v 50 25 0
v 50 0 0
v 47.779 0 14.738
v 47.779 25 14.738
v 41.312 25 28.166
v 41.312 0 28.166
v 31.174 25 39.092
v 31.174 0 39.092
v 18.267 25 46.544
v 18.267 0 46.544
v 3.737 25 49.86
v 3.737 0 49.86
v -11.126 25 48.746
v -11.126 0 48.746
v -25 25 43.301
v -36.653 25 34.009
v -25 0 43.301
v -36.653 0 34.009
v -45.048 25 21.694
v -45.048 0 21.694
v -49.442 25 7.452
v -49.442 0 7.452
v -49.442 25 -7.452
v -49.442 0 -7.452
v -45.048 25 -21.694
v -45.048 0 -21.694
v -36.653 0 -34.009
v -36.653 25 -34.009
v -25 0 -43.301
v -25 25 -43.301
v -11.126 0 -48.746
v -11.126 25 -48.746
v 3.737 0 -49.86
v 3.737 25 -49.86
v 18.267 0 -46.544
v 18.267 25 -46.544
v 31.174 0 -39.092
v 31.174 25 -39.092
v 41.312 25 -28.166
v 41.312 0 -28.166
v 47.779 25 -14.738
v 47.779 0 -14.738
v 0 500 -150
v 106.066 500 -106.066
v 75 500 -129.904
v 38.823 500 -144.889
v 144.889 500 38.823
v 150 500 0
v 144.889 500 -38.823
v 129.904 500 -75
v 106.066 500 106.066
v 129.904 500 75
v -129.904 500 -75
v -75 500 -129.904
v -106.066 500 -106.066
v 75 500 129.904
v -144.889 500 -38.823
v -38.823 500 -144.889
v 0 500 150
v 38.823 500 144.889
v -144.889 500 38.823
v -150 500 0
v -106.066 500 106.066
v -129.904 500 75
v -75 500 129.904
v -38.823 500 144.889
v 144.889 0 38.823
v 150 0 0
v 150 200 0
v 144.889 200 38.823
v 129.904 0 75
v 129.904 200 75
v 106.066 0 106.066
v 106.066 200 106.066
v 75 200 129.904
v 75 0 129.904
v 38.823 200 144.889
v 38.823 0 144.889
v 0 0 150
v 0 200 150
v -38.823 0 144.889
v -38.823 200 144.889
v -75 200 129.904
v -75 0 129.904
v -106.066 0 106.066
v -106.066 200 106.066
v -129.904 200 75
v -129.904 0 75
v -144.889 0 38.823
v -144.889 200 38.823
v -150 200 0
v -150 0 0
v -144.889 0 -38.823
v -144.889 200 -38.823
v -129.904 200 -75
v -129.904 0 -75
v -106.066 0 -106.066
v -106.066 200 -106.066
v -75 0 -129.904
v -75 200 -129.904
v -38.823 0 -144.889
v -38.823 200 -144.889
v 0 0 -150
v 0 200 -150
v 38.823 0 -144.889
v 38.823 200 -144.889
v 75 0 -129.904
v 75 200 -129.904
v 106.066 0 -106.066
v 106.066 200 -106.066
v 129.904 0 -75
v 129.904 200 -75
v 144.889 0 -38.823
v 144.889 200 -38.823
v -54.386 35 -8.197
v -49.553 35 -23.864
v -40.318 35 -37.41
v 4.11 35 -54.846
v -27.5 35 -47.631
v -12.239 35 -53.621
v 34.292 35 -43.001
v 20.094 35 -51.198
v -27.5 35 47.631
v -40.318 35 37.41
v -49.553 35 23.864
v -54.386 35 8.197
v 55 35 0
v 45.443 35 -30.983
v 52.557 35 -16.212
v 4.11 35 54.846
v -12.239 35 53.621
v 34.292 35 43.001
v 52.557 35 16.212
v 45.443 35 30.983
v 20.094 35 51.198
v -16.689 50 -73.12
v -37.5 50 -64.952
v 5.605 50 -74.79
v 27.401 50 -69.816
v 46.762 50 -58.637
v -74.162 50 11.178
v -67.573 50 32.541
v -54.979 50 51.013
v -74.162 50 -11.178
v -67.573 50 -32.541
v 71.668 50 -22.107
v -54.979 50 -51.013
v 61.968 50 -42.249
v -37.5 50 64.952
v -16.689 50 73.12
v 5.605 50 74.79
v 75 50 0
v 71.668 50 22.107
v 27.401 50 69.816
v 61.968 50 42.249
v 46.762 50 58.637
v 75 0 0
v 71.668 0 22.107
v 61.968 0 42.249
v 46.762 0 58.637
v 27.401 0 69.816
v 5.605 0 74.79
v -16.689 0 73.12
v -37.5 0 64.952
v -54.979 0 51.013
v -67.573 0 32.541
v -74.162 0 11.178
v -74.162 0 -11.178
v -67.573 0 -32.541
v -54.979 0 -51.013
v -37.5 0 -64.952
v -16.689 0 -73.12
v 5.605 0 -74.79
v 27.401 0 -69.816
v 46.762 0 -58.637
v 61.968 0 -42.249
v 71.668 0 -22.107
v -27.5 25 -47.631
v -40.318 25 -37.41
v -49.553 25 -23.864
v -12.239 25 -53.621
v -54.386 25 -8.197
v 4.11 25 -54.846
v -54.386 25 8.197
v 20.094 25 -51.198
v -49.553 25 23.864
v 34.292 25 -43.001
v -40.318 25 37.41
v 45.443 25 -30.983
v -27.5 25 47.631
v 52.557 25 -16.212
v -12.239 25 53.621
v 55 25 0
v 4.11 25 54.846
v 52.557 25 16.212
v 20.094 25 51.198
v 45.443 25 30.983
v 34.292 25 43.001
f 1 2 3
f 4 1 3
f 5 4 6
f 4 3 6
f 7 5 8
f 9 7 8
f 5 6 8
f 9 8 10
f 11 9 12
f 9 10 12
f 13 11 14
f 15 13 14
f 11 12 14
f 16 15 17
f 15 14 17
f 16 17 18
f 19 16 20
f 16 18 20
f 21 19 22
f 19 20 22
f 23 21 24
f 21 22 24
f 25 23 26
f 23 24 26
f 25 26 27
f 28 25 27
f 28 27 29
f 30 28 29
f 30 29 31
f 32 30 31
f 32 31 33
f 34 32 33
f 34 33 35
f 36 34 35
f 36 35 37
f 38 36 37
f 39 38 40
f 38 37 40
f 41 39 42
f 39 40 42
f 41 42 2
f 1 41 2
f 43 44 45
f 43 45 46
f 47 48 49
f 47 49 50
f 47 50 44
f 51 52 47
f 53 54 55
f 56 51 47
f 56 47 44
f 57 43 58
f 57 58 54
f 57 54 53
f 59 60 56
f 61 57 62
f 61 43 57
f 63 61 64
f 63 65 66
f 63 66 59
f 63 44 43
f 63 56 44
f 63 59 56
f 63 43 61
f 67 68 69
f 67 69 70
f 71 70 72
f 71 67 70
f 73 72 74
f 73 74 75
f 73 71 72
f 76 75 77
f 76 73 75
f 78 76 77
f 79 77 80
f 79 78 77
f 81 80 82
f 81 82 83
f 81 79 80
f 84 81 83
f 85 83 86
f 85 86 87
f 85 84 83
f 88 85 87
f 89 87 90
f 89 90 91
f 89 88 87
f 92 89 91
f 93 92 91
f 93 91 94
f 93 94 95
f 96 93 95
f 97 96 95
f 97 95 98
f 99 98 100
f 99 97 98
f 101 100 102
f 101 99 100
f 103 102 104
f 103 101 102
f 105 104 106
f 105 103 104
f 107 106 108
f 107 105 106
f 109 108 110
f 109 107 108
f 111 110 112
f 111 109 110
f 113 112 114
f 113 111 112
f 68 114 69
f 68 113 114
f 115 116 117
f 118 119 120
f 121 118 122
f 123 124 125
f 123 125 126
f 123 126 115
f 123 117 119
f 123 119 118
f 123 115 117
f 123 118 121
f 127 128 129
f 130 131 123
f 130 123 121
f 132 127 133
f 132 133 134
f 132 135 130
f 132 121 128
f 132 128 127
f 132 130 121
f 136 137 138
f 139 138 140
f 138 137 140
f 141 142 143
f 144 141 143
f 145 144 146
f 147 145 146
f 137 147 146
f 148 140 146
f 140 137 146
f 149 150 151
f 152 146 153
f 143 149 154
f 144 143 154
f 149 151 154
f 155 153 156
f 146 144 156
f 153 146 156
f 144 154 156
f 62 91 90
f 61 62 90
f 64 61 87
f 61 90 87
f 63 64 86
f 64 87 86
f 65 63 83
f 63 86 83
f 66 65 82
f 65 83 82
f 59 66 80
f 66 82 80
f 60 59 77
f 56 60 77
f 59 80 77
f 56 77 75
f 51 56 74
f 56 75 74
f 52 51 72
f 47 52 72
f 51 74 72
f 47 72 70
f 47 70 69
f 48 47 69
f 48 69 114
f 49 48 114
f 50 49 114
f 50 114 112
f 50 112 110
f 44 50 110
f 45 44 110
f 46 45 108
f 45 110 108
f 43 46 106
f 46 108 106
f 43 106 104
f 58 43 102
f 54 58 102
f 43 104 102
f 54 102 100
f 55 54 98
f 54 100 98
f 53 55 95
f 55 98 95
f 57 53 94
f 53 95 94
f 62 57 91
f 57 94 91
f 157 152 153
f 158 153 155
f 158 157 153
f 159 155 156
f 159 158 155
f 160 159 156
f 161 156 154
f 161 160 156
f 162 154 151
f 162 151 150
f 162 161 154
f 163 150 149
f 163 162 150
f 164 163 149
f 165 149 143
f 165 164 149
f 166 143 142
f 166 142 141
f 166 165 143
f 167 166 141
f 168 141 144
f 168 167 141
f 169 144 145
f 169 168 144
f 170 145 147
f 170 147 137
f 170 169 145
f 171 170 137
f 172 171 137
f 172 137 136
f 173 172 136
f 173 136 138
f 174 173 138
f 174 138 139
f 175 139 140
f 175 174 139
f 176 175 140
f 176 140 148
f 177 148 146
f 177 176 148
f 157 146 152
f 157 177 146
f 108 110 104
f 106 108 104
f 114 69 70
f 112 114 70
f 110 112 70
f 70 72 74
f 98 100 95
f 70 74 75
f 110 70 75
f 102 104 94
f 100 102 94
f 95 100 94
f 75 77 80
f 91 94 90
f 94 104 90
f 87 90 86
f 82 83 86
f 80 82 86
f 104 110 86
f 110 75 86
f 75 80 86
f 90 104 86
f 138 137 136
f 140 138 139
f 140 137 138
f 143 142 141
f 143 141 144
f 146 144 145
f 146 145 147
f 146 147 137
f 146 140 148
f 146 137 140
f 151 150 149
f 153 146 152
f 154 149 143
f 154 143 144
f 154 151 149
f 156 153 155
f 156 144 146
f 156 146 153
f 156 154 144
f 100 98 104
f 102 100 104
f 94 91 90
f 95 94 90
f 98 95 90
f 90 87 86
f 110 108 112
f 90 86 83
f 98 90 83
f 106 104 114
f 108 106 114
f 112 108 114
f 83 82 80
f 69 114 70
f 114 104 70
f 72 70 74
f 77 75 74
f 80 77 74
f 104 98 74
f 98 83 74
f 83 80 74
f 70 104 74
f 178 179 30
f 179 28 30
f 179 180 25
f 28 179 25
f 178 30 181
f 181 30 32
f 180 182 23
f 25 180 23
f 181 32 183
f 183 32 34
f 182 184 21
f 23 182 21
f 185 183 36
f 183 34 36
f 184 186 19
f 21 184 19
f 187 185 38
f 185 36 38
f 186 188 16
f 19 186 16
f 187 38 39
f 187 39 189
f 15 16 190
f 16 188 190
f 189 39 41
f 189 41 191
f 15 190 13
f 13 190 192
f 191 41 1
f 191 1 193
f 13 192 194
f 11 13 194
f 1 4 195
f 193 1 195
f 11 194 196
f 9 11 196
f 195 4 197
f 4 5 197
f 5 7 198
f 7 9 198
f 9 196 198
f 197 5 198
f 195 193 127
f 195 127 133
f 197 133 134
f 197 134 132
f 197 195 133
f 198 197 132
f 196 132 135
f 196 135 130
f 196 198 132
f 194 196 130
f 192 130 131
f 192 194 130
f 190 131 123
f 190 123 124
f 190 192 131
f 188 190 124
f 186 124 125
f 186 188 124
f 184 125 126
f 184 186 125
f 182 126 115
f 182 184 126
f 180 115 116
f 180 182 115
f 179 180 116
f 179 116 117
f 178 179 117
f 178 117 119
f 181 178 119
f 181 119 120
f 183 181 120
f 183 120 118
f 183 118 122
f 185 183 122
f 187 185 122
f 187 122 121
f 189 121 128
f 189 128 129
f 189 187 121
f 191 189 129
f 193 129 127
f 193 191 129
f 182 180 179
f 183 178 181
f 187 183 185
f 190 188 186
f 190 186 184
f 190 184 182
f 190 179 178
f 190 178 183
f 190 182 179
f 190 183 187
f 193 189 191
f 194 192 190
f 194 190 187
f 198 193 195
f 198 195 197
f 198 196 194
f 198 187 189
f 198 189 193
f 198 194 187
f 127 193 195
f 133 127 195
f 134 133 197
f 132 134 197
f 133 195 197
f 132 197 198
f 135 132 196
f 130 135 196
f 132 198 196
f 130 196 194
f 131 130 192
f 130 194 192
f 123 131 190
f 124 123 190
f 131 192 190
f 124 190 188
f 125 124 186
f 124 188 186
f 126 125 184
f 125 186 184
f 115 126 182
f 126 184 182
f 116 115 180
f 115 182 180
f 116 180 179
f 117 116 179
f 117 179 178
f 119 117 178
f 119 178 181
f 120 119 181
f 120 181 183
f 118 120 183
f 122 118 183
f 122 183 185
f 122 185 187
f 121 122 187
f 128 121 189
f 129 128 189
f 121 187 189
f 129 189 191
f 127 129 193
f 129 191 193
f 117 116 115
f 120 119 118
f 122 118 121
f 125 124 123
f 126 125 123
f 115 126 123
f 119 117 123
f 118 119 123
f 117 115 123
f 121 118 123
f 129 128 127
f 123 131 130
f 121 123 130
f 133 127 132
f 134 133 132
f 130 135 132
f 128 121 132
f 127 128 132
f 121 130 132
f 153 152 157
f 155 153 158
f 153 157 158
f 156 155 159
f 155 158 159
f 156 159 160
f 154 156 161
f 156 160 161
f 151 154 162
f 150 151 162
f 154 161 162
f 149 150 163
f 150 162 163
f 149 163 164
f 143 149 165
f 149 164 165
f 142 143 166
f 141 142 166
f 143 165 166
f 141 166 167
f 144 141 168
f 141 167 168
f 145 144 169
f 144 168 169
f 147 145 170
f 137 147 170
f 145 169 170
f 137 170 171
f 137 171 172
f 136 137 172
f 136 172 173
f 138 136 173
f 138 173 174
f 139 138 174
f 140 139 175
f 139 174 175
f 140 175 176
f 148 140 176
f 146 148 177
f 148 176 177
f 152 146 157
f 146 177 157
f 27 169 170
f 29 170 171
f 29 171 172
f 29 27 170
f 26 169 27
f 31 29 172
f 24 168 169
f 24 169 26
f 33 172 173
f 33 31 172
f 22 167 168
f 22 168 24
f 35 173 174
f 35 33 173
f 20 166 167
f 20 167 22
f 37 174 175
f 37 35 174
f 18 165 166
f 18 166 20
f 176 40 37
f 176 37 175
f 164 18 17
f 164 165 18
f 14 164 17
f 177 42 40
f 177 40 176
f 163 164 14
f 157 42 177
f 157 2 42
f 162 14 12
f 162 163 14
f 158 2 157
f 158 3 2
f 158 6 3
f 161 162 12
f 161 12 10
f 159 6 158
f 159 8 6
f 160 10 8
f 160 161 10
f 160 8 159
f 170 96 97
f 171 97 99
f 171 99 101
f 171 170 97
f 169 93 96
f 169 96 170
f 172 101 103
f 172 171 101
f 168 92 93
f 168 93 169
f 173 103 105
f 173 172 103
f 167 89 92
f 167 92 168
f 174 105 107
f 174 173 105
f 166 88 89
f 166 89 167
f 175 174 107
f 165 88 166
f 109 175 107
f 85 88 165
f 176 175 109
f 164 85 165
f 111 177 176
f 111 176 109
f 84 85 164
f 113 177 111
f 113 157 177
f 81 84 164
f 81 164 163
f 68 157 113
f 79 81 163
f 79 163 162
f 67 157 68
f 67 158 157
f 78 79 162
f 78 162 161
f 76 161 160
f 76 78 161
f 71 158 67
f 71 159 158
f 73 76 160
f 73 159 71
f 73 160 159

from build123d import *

# Parameters (mm, degrees)
F0_R      = 150
F3_DEPTH  = 200
F1_R      = 75
F4_DEPTH  = 50
F5_DEPTH  = 50
F2_R      = 50
F6_DEPTH  = 25
F7_R      = 55
F8_DEPTH  = 10
F9_DEPTH  = 10
F10_R     = 150
F11_DEPTH = 300


with BuildPart() as f3:
    # F0 (on Front) → F3 (new body)
    with BuildSketch(Plane.XZ):
        Circle(F0_R)
    extrude(amount=-F3_DEPTH)

    # F1 (on Front) → F4 (cut)
    with BuildSketch(Plane.XZ):
        Circle(F1_R)
    extrude(amount=-F4_DEPTH, mode=Mode.SUBTRACT)


with BuildPart() as f5:
    # F1 (on Front) → F5 (new body, through all)
    with BuildSketch(Plane.XZ):
        Circle(F1_R)
    extrude(amount=-F5_DEPTH)

    # F2 (on Front) → F6 (cut)
    with BuildSketch(Plane.XZ):
        Circle(F2_R)
    extrude(amount=-F6_DEPTH, mode=Mode.SUBTRACT)

    # F7 (on face) → F8 (cut)
    with BuildSketch(Plane.XZ.offset(-25)):
        Circle(F7_R)
    extrude(amount=-F8_DEPTH, mode=Mode.SUBTRACT)


with BuildPart() as f9:
    # F7 (on face) → F9 (new body, through all)
    with BuildSketch(Plane.XZ.offset(-25)):
        Circle(F7_R)
    extrude(amount=-F9_DEPTH)


with BuildPart() as f11:
    # F10 (on face) → F11 (new body)
    with BuildSketch(Plane(origin=(0, 200, 0), x_dir=(-1, 0, 0), z_dir=(0, 1, 0))):
        Circle(F10_R)
    extrude(amount=F11_DEPTH)


solid = Compound([f3.part, f5.part, f9.part, f11.part])
